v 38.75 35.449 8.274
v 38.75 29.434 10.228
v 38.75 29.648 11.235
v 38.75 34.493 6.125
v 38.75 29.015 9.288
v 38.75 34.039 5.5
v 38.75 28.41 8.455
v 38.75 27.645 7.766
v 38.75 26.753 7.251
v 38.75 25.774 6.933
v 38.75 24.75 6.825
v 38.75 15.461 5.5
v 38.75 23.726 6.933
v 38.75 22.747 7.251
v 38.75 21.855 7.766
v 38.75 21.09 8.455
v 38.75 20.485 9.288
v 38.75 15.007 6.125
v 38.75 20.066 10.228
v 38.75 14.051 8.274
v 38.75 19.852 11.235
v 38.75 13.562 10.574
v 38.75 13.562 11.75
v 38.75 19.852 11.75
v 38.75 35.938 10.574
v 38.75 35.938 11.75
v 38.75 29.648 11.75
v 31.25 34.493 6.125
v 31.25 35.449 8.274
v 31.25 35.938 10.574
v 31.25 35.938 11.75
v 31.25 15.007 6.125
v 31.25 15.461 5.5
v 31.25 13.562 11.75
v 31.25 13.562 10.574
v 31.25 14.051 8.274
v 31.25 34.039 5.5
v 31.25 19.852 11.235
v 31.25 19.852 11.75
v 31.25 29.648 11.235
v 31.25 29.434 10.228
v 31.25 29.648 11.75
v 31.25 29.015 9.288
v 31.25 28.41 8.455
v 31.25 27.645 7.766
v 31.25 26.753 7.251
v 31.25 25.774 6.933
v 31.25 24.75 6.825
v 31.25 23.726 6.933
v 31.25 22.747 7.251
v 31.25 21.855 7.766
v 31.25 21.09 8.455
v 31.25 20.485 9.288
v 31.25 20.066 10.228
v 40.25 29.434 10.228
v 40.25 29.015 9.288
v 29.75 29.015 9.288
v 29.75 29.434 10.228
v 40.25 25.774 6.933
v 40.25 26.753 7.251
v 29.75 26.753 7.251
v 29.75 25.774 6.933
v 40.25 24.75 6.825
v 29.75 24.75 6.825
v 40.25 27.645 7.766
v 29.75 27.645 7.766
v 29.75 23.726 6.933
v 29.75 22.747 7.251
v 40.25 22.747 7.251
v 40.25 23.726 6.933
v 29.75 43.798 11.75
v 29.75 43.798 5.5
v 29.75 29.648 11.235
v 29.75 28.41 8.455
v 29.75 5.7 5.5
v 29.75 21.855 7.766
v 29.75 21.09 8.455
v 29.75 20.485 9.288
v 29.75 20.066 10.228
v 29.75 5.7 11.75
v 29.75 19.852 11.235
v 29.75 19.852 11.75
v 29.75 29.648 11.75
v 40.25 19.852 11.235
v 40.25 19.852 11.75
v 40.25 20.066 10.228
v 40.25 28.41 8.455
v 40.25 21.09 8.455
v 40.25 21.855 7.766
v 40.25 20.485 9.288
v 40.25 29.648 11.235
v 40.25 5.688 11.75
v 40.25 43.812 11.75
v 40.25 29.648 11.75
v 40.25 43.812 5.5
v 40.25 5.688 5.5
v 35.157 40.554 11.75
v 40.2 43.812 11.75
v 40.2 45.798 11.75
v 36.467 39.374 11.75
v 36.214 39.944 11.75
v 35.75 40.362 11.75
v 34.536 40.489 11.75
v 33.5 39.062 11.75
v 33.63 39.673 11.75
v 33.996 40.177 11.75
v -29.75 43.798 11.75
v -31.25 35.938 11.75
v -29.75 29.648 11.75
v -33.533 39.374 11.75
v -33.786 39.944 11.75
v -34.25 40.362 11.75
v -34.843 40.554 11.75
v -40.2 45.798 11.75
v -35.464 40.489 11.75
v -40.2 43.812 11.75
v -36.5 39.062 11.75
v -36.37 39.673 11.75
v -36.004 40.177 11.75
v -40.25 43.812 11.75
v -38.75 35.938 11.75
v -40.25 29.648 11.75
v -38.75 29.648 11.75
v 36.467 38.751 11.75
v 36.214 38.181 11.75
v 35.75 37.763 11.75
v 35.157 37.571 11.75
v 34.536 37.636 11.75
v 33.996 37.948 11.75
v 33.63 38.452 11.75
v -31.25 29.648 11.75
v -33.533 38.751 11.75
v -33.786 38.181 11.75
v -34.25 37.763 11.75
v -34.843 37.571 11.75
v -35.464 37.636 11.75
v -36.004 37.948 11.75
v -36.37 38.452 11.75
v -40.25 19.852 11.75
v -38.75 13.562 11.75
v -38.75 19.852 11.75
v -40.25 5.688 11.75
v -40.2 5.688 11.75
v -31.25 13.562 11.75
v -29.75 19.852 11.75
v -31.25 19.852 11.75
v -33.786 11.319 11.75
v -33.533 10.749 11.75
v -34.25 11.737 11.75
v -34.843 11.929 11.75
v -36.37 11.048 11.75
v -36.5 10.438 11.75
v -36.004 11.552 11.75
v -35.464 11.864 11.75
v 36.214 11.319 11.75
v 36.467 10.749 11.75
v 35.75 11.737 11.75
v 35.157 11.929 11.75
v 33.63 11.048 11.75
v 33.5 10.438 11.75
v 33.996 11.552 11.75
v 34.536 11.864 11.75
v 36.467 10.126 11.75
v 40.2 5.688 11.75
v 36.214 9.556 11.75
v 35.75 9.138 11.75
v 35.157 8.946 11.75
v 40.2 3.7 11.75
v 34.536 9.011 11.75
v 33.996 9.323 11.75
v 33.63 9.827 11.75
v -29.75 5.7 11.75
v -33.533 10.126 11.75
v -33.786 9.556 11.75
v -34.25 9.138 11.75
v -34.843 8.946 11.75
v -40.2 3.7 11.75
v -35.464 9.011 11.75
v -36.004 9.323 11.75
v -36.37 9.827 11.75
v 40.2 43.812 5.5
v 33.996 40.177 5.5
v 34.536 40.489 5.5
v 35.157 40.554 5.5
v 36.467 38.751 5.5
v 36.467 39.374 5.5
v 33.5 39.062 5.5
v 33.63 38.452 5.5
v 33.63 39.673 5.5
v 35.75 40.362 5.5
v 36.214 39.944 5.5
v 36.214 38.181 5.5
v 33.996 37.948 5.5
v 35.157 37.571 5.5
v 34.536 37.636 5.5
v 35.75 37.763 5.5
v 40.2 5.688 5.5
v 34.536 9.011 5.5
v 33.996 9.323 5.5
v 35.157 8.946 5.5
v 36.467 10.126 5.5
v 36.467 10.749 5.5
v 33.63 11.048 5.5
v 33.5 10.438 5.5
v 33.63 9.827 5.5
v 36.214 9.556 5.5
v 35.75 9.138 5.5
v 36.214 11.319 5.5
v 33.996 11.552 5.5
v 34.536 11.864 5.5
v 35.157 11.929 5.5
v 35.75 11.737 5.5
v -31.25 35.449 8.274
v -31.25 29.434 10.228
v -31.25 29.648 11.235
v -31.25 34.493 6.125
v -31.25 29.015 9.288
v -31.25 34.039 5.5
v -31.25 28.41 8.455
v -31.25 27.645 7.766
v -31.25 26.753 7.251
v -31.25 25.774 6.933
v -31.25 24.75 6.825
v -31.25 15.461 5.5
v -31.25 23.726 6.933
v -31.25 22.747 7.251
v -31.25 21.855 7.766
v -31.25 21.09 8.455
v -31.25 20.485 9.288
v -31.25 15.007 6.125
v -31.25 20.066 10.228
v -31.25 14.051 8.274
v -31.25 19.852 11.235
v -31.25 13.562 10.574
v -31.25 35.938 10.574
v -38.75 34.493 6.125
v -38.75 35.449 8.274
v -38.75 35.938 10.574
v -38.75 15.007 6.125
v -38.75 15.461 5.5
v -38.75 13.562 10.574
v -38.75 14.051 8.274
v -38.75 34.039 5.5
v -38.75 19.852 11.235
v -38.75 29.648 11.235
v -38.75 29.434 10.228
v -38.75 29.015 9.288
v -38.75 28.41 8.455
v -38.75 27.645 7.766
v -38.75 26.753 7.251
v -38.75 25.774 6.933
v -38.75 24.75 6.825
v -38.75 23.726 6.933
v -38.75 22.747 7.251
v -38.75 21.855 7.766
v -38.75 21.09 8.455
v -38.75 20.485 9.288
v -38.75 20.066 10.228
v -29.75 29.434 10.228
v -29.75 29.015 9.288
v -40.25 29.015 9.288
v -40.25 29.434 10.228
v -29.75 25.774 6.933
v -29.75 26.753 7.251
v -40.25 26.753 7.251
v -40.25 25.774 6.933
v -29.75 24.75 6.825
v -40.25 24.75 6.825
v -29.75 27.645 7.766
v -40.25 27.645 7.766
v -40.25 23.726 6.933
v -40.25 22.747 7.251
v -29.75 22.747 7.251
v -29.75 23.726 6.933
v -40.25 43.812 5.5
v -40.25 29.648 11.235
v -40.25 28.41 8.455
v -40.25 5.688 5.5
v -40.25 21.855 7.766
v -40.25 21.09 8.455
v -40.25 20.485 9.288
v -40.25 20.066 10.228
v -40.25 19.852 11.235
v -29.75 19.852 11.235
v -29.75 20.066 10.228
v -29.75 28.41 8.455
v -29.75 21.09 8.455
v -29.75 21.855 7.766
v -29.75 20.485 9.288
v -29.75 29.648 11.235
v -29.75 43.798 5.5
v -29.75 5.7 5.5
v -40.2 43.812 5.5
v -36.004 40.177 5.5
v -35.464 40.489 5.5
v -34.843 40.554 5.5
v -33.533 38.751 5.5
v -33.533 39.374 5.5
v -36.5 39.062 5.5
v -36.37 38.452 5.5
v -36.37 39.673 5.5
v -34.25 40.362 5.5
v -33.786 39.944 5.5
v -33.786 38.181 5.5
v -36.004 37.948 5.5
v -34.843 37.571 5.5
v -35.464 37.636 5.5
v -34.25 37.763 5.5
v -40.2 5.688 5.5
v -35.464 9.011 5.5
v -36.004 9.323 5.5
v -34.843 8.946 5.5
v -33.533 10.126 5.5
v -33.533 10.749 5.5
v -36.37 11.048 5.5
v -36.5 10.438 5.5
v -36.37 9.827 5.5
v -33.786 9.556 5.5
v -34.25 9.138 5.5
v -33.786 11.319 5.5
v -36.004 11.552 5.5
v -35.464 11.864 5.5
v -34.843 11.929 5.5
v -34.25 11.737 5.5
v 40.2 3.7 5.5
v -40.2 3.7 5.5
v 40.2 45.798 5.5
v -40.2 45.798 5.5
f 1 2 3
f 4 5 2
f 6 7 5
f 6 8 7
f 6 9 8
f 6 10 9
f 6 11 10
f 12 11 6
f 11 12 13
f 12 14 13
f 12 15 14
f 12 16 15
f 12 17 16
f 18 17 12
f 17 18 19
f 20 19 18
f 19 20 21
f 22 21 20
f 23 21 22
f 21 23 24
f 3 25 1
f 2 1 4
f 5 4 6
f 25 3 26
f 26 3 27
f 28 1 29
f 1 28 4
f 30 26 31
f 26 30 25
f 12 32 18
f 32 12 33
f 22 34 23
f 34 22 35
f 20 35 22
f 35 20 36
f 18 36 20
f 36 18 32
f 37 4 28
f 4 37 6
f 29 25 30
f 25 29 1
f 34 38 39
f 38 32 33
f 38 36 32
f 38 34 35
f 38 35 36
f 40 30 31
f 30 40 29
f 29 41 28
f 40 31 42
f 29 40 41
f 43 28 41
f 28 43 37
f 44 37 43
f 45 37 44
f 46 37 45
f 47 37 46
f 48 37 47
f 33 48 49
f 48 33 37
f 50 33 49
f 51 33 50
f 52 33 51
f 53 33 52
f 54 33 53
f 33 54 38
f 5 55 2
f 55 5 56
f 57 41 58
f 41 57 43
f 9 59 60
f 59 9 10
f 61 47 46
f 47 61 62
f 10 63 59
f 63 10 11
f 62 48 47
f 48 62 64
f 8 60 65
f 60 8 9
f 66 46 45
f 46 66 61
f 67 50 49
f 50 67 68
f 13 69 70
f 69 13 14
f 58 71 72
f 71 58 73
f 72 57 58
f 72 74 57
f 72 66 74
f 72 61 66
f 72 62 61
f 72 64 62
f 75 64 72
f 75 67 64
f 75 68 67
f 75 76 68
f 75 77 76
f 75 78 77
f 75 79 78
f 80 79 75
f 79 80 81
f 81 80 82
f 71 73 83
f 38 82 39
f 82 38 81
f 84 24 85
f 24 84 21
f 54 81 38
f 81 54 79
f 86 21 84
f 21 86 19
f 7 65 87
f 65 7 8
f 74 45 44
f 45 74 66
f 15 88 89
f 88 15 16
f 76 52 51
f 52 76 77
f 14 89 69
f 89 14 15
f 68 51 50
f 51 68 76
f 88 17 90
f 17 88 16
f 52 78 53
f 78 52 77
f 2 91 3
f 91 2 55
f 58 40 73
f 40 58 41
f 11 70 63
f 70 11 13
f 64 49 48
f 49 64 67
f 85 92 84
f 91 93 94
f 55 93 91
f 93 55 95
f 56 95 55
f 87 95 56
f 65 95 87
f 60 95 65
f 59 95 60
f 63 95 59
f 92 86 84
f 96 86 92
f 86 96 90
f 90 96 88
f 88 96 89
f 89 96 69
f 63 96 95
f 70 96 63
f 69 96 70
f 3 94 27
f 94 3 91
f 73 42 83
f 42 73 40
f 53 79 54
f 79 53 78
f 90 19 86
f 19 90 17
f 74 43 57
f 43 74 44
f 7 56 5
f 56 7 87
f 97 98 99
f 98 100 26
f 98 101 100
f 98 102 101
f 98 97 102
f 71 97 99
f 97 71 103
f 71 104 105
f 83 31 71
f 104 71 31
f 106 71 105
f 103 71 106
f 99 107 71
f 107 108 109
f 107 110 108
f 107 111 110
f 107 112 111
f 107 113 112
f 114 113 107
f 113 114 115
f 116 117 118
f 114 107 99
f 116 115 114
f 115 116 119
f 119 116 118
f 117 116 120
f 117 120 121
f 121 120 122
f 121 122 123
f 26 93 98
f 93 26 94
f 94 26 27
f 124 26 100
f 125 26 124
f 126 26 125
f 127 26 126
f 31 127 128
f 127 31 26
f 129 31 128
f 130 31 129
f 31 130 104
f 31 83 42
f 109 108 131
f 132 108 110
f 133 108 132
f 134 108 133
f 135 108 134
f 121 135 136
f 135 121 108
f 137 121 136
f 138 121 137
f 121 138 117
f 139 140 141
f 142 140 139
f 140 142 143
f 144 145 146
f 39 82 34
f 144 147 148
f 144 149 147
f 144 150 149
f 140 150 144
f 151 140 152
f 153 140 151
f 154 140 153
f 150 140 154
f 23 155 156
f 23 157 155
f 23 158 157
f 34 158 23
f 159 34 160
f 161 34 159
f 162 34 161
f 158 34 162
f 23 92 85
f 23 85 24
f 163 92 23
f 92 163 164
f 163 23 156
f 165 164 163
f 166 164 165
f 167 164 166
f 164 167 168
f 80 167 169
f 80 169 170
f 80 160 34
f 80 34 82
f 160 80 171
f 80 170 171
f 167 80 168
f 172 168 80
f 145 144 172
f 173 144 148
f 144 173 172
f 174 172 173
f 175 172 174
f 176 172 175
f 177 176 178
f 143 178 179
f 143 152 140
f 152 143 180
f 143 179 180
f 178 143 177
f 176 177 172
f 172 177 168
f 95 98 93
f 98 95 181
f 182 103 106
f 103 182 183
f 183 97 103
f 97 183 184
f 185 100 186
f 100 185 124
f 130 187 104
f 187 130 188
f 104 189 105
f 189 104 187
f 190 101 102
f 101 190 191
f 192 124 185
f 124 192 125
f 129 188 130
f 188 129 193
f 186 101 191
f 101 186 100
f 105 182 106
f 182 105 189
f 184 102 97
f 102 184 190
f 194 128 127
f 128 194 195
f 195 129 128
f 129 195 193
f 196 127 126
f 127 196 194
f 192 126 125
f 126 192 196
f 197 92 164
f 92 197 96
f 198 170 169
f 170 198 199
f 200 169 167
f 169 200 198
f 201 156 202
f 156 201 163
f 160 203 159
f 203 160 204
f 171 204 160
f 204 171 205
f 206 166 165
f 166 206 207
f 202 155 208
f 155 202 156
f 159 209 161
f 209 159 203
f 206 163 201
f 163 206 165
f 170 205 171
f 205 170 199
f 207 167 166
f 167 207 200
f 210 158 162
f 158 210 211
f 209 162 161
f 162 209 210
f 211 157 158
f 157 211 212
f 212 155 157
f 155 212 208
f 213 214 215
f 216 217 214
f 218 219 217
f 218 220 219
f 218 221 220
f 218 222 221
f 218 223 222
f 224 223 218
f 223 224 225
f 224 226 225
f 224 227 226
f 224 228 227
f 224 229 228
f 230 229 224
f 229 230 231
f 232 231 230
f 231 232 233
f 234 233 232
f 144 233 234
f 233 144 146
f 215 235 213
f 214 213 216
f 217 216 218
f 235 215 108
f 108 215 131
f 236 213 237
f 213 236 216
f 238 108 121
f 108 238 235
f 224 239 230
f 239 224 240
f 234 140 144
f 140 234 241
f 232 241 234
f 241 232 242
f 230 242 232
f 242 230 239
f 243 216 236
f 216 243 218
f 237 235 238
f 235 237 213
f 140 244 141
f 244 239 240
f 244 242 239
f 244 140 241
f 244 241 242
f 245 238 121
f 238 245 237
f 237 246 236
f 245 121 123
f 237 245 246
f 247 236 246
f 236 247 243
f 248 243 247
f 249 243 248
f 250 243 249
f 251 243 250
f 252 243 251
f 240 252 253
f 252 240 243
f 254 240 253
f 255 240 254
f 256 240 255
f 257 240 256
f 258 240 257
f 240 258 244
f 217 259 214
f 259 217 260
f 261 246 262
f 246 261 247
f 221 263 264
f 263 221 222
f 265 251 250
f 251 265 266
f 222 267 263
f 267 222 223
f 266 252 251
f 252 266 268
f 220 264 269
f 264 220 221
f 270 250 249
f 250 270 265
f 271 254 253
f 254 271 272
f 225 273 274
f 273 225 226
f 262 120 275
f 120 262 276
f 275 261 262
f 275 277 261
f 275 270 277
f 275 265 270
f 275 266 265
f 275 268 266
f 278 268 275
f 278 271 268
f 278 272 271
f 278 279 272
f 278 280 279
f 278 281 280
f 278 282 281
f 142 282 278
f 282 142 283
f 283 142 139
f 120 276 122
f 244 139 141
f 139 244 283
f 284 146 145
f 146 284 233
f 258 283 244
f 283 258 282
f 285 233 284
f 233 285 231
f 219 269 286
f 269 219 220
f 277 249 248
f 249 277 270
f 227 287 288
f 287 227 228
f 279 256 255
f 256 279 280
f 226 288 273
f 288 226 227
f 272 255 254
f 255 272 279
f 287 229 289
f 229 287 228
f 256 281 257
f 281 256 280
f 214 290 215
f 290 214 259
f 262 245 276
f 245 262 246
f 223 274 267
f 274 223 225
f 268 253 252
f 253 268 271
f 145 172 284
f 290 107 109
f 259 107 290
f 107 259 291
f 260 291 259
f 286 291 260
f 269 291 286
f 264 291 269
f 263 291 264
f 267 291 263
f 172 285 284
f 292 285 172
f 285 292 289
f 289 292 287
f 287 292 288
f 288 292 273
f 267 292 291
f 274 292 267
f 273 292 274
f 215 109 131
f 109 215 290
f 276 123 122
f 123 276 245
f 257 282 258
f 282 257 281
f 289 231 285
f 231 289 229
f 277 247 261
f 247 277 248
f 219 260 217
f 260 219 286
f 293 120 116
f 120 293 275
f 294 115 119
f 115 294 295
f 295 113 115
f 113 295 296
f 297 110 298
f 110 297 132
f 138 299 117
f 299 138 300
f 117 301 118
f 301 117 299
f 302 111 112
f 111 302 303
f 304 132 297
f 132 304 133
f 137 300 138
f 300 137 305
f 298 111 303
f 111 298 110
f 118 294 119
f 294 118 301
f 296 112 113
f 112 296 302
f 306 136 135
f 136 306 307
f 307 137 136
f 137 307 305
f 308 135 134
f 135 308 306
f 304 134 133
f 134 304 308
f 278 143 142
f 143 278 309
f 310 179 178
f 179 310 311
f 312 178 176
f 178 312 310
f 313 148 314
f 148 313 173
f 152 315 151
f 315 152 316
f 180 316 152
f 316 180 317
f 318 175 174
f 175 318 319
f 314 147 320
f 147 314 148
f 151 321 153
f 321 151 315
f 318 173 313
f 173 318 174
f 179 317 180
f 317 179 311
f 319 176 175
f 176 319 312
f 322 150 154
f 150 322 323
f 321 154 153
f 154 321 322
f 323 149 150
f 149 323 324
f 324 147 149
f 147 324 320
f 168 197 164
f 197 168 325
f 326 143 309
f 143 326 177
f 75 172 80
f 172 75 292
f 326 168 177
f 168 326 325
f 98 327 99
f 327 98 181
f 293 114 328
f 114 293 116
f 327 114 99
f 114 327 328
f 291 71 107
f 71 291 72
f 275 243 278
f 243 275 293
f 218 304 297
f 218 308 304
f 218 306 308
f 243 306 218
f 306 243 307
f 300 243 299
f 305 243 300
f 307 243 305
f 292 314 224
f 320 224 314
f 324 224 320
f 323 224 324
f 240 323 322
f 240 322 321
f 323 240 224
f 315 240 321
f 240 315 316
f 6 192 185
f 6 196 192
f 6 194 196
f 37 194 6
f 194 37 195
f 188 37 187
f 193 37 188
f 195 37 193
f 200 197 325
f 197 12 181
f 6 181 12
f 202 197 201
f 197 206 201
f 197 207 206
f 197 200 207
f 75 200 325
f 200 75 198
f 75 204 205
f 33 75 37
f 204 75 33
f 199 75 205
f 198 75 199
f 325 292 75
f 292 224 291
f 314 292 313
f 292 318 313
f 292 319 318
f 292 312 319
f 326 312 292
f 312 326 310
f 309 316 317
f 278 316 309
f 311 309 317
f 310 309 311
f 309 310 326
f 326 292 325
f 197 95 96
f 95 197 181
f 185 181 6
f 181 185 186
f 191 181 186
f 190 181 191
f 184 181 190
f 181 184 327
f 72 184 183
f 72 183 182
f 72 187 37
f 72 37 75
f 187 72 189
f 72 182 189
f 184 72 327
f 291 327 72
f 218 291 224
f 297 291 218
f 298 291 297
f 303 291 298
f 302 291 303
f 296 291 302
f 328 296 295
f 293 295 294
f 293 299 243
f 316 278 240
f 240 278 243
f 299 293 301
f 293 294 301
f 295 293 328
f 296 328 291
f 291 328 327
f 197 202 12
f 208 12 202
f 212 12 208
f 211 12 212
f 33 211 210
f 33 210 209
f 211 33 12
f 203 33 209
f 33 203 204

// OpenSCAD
module spur_gear() {
  difference() {
    rotate([90,18w0,0]) import("Spur_Gear_Axle.stl", convexity=3);
    translate([2.5,-25,-25]) cube([20,50,50]);
    translate([-22.5,-25,-25]) cube([20,50,50]);
    cube([10, 5.65, 3.8], center=true);
  }
}

// difference() {
//   cube([1, 10, 10], center=true);
//   cube([10, 5.65, 3.8], center=true);
// }

bearing_id=7.85;

module connector() {
  rotate([0, 90, 0]) {

    translate([-5,0,0]) cube([25, 4.8, 3.4], center=true);
    translate([7,0,0]) rotate([0,90,0]) {
      // translate([0,0,-5]) cylinder(d1=3.5, d2=5.9, h=5, $fn=30, center=true);
      translate([0,0,5]) cylinder(d=5.8, h=5, $fn=30, center=true);
      translate([0,0,6]) cube([bearing_id+2, 1.5, 3], center=true);

      translate([0,0,-6])cylinder(d=bearing_id, h=10, $fn=30, center=true);
      translate([0,0,1])cylinder(d2=5.8, d1=bearing_id+2, h=5, $fn=30, center=true);
    }

  }
}

bearing_width=7 + 0.5;
bearing_od=22 + 0.5;

module base_bearing_carrier() {  
  union() {
    difference() {
      translate([(bearing_od+2)/4,0,0]) cube([(bearing_od+2)/2,bearing_od+2,bearing_width+3], center=true);
      union() {
        cylinder(h=bearing_width+0, d=bearing_od, center=true, $fn=30);
        cylinder(h=bearing_width+3, d=bearing_id+2, center=true, $fn=30);
      }
    }

    mirror([0,0,0]) translate([(bearing_od+2)/4,(bearing_od+2)/1.6,0]) { 
      difference() {
        cube([(bearing_od+2)/2,bearing_od/3,bearing_width+3], center=true);
        // screw hole
        rotate([0,90,0]) translate([0,-1,-10]) cylinder(h=bearing_od+2, d=3, $fn=15);
      }
    }
    mirror([0,1,0]) translate([(bearing_od+2)/4,(bearing_od+2)/1.6,0]) {
      difference() {
        cube([(bearing_od+2)/2,bearing_od/3,bearing_width+3], center=true);
        // screw hole
        rotate([0,90,0]) translate([0,-1,-10]) cylinder(h=bearing_od+2, d=3, $fn=15);
      }
    }
  }

}

module top_bearing_carrier() {
  rotate([0,90,0]) {
    difference() {
      base_bearing_carrier();
      // cut the bottom off
      translate([bearing_od/3,-bearing_od*1.5,-bearing_width]) cube([bearing_od/2,bearing_od*3,bearing_width*2]);
    }
  }
}


// base_bearing_carrier();
module lower_carrier_frame() {
  difference() {
    union() {
      translate([0,4.7,bearing_od/4]) cube([80.4,2,(bearing_od+2)/2], center=true);
      translate([0,(bearing_od*1.991),bearing_od/4]) cube([80.4,2,(bearing_od+2)/2], center=true);
      translate([35,(bearing_od*1.10),(bearing_od/2)+0.5]) rotate([0,90,0]) base_bearing_carrier();
      translate([-35,(bearing_od*1.10),(bearing_od/2)+0.5]) rotate([0,90,0]) base_bearing_carrier();
    }
    // chop the bottom
    translate([0,25,1]) cube([81,50,9], center=true);
  }
}

// connector();
lower_carrier_frame();
// top_bearing_carrier();
